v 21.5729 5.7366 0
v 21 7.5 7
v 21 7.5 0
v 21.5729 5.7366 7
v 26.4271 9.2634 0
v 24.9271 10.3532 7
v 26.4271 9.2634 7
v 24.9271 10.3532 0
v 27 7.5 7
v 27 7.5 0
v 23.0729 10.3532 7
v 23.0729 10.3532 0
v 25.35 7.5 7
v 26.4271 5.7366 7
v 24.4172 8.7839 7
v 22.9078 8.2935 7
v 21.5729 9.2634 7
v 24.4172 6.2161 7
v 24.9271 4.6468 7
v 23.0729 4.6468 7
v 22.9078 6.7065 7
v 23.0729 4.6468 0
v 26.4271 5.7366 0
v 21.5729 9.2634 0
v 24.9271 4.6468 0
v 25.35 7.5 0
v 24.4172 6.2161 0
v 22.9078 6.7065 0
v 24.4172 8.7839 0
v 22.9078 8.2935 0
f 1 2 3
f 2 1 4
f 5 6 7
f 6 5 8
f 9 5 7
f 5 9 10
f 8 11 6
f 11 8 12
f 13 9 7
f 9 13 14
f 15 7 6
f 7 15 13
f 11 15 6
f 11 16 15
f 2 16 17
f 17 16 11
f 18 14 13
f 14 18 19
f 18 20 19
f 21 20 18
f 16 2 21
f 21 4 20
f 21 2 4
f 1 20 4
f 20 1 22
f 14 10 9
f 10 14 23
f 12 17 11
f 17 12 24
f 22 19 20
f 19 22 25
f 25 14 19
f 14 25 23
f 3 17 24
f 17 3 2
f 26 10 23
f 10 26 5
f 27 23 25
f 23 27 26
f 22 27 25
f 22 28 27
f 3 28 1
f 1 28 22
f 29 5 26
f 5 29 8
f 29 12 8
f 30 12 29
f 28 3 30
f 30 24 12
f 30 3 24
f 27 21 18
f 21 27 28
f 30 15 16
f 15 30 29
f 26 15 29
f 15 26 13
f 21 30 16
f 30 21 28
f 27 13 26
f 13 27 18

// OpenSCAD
// file: shapes.scad
/*
 *  OpenSCAD Shapes Library (www.openscad.org)
 *  Copyright (C) 2009  Catarina Mota
 *
 *  This program is free software; you can redistribute it and/or modify
 *  it under the terms of the GNU General Public License as published by
 *  the Free Software Foundation; either version 2 of the License, or
 *  (at your option) any later version.
 *
 *  This program is distributed in the hope that it will be useful,
 *  but WITHOUT ANY WARRANTY; without even the implied warranty of
 *  MERCHANTABILITY or FITNESS FOR A PARTICULAR PURPOSE.  See the
 *  GNU General Public License for more details.
 *
 *  You should have received a copy of the GNU General Public License
 *  along with this program; if not, write to the Free Software
 *  Foundation, Inc., 59 Temple Place, Suite 330, Boston, MA  02111-1307  USA
 *
*/


//box(width, height, depth);
//roundedBox(width, height, depth, factor);
//cone(height, radius);
//oval(width, height, depth);
//tube(height, radius, wall);
//ovalTube(width, height, depth, wall);
//hexagon(height, depth);
//octagon(height, depth);
//dodecagon(height, depth);
//hexagram(height, depth);
//rightTriangle(adjacent, opposite, depth);
//equiTriangle(side, depth);
//12ptStar(height, depth);

//----------------------

// size is a vector [w, h, d]
module box(size) {
  cube(size, true);
}

// size is a vector [w, h, d]
module roundedBox(size, radius) {
  cube(size - [2*radius,0,0], true);
  cube(size - [0,2*radius,0], true);
  for (x = [radius-size[0]/2, -radius+size[0]/2],
       y = [radius-size[1]/2, -radius+size[1]/2]) {
    translate([x,y,0]) cylinder(r=radius, h=size[2], center=true);
  }
}

module cone(height, radius, center = false) {
  cylinder(height, radius, 0, center);
}

module oval(w,h, height, center = false) {
  scale([1, h/w, 1]) cylinder(h=height, r=w, center=center);
}

// wall is wall thickness
module tube(height, radius, wall, center = false) {
  difference() {
    cylinder(h=height, r=radius, center=center);
    cylinder(h=height, r=radius-wall, center=center);
  }
}

// wall is wall thickness
module ovalTube(height, rx, ry, wall, center = false) {
  difference() {
    scale([1, ry/rx, 1]) cylinder(h=height, r=rx, center=center);
    scale([(rx-wall)/rx, (ry-wall)/rx, 1]) cylinder(h=height, r=rx, center=center);
  }
}

// size is the XY plane size, height in Z
module hexagon(size, height) {
  boxWidth = size/1.75;
  for (r = [-60, 0, 60]) rotate([0,0,r]) cube([boxWidth, size, height], true);
}

// size is the XY plane size, height in Z
module octagon(size, height) {
  intersection() {
    cube([size, size, height], true);
    rotate([0,0,45]) cube([size, size, height], true);
  }
}

// size is the XY plane size, height in Z
module dodecagon(size, height) {
  intersection() {
    hexagon(size, height);
    rotate([0,0,90]) hexagon(size, height);
  }
}

// size is the XY plane size, height in Z
module hexagram(size, height) {
  boxWidth=size/1.75;
  for (v = [[0,1],[0,-1],[1,-1]]) {
    intersection() {
      rotate([0,0,60*v[0]]) cube([size, boxWidth, height], true);
      rotate([0,0,60*v[1]]) cube([size, boxWidth, height], true);
    }
  }
}

module rightTriangle(adjacent, opposite, height) {
  difference() {
    translate([-adjacent/2,opposite/2,0]) cube([adjacent, opposite, height], true);
    translate([-adjacent,0,0]) {
      rotate([0,0,atan(opposite/adjacent)]) dislocateBox(adjacent*2, opposite, height);
    }
  }
}

module equiTriangle(side, height) {
  difference() {
    translate([-side/2,side/2,0]) cube([side, side, height], true);
    rotate([0,0,30]) dislocateBox(side*2, side, height);
    translate([-side,0,0]) {
      rotate([0,0,60]) dislocateBox(side*2, side, height);
    }
  }
}

module 12ptStar(size, height) {
  starNum = 3;
  starAngle = 360/starNum;
  for (s = [1:starNum]) {
    rotate([0, 0, s*starAngle]) cube([size, size, height], true);
  }
}

//-----------------------
//MOVES THE ROTATION AXIS OF A BOX FROM ITS CENTER TO THE BOTTOM LEFT CORNER
//FIXME: Why are the dimensions changed?
// why not just translate([0,0,-d/2]) cube([w,h,d]);
module dislocateBox(w,h,d) {
  translate([w/2,h,0]) {
    difference() {
      cube([w, h*2, d+1]);
      translate([-w,0,0]) cube([w, h*2, d+1]);
    }
  }
}
// file: screw_standoffs.scad
module screw_standoff(outer_diameter,inner_diameter,height)
{
    difference()
    {
        cylinder(r=outer_diameter/2, h = height);
        cylinder(r=inner_diameter/2, h = height);
    }
}

module screw_push_fit(diameter,height)
{
    union()
    {
        trad = diameter/2;
        cylinder(r=trad, h = height-trad);
        translate([0,0,height-trad])
        {
            sphere(r = trad);
        }
    }
}

//m3 2.7


//screw_standoff(5,2.7,6);
//translate ([5,5,0]) screw_push_fit(3.1,5);
// main file
use <screw_standoffs.scad>
use <shapes.scad>

module part_dht11_pcb_unions()
{
    % cube([16,15,7]);
    translate([0,0,7]) % cube([40,15,2]);
    translate([24,7.5,0]) screw_standoff(6,2.7,7);
}

module part_dht11_pcb_diffs()
{
    translate([-5,7,5])
    rotate(a=90,v=[1,0,0])
    rotate(a=90,v=[0,1,0])
    roundedBox([9,4,20],1);
}

module part_3231_rtc_pcb_unions()
{
    translate([0,0,5])
    {
        % cube([50,22,2]);
        translate([18,11,0]) % cylinder(r=10, h= 8);
    }
    translate([4 ,20,0]) screw_standoff(6,2.7,5);
    translate([30,3,0]) screw_standoff(6,2.7,5);
    translate([30,20,0]) screw_standoff(6,2.7,5);
}

part_dht11_pcb_unions();
//part_dht11_pcb_diffs();
//part_3231_rtc_pcb_unions();
